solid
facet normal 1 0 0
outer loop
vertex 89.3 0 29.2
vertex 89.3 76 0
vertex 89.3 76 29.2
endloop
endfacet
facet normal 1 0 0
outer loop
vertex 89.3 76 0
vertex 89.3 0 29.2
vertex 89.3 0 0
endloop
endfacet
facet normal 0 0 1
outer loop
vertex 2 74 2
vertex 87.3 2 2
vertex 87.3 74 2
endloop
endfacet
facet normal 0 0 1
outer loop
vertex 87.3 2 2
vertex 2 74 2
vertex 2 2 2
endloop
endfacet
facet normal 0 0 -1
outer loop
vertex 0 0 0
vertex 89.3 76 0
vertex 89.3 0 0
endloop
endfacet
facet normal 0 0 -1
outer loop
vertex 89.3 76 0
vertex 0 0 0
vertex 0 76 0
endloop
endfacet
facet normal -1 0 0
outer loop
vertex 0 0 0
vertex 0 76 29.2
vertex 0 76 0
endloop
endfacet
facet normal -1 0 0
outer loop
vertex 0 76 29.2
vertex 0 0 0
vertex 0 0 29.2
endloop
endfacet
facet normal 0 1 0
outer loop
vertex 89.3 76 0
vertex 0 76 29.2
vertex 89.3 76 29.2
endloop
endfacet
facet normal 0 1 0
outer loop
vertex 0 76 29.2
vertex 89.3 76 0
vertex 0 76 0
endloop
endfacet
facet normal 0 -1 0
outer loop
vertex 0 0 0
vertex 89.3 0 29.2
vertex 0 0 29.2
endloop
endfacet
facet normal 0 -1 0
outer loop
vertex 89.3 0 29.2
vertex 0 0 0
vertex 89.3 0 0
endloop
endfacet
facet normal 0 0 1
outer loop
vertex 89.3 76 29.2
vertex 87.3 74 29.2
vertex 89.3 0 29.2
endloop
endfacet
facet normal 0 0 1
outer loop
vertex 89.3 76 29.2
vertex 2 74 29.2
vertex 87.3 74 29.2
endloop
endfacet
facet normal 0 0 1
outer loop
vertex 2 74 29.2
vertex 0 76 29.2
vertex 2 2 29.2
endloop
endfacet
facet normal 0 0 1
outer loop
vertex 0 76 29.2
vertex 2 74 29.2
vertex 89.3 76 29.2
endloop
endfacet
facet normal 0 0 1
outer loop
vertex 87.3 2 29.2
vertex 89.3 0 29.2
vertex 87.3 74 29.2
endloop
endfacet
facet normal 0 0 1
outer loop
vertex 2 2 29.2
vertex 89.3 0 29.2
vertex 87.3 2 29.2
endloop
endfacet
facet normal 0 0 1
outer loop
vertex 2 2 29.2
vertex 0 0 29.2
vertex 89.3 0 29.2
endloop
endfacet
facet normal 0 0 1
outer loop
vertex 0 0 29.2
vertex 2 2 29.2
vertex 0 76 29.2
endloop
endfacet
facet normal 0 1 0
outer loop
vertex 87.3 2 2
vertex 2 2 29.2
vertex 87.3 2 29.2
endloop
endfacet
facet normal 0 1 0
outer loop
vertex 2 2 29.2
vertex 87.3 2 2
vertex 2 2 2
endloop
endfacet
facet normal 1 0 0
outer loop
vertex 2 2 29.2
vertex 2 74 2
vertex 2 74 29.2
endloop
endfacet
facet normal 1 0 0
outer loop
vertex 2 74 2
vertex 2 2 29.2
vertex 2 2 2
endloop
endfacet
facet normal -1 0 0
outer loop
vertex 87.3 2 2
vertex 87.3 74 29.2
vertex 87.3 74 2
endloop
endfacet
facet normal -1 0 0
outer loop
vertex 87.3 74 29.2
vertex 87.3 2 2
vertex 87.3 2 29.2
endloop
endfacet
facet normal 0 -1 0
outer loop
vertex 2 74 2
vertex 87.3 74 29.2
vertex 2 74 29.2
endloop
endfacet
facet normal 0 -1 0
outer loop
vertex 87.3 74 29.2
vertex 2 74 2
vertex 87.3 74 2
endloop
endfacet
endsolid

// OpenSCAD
BOX_Y = 76;
BOX_X = 89.3;
BOX_Z = 29.2;
BOX_THICK = 2;

BOARD_Z = 3;

SCREW_Z = 5;

FN = 64;

// base
cube ([BOX_X, BOX_Y, BOX_THICK]);

// walls
// front wall
cube ([BOX_X, BOX_THICK, BOX_Z]);
// left wall
cube ([BOX_THICK, BOX_Y, BOX_Z]);
// right wall
translate ([BOX_X - BOX_THICK, 0, 0]) {
    cube ([BOX_THICK, BOX_Y, BOX_Z]);
}
// back wall
translate ([0, BOX_Y - BOX_THICK, 0]) {
    cube ([BOX_X, BOX_THICK, BOX_Z]);
}

// boards screw holes
linear_extrude(height = BOARD_Z + BOX_THICK) {
    import(file = "../drawings/camera.dxf", layer = "openscad-box-board", $fn=FN);
}

// cover support
linear_extrude(height = BOX_Z - BOX_THICK) {
    import(file = "../drawings/camera.dxf", layer = "openscad-box-support", $fn=FN);
}

// cover screws holes
linear_extrude(height = BOX_Z - BOX_THICK - SCREW_Z) {
    import(file = "../drawings/camera.dxf", layer = "openscad-box-screwsbase", $fn=FN);
}
linear_extrude(height = BOX_Z - BOX_THICK) {
    import(file = "../drawings/camera.dxf", layer = "openscad-box-screws", $fn=FN);
}
